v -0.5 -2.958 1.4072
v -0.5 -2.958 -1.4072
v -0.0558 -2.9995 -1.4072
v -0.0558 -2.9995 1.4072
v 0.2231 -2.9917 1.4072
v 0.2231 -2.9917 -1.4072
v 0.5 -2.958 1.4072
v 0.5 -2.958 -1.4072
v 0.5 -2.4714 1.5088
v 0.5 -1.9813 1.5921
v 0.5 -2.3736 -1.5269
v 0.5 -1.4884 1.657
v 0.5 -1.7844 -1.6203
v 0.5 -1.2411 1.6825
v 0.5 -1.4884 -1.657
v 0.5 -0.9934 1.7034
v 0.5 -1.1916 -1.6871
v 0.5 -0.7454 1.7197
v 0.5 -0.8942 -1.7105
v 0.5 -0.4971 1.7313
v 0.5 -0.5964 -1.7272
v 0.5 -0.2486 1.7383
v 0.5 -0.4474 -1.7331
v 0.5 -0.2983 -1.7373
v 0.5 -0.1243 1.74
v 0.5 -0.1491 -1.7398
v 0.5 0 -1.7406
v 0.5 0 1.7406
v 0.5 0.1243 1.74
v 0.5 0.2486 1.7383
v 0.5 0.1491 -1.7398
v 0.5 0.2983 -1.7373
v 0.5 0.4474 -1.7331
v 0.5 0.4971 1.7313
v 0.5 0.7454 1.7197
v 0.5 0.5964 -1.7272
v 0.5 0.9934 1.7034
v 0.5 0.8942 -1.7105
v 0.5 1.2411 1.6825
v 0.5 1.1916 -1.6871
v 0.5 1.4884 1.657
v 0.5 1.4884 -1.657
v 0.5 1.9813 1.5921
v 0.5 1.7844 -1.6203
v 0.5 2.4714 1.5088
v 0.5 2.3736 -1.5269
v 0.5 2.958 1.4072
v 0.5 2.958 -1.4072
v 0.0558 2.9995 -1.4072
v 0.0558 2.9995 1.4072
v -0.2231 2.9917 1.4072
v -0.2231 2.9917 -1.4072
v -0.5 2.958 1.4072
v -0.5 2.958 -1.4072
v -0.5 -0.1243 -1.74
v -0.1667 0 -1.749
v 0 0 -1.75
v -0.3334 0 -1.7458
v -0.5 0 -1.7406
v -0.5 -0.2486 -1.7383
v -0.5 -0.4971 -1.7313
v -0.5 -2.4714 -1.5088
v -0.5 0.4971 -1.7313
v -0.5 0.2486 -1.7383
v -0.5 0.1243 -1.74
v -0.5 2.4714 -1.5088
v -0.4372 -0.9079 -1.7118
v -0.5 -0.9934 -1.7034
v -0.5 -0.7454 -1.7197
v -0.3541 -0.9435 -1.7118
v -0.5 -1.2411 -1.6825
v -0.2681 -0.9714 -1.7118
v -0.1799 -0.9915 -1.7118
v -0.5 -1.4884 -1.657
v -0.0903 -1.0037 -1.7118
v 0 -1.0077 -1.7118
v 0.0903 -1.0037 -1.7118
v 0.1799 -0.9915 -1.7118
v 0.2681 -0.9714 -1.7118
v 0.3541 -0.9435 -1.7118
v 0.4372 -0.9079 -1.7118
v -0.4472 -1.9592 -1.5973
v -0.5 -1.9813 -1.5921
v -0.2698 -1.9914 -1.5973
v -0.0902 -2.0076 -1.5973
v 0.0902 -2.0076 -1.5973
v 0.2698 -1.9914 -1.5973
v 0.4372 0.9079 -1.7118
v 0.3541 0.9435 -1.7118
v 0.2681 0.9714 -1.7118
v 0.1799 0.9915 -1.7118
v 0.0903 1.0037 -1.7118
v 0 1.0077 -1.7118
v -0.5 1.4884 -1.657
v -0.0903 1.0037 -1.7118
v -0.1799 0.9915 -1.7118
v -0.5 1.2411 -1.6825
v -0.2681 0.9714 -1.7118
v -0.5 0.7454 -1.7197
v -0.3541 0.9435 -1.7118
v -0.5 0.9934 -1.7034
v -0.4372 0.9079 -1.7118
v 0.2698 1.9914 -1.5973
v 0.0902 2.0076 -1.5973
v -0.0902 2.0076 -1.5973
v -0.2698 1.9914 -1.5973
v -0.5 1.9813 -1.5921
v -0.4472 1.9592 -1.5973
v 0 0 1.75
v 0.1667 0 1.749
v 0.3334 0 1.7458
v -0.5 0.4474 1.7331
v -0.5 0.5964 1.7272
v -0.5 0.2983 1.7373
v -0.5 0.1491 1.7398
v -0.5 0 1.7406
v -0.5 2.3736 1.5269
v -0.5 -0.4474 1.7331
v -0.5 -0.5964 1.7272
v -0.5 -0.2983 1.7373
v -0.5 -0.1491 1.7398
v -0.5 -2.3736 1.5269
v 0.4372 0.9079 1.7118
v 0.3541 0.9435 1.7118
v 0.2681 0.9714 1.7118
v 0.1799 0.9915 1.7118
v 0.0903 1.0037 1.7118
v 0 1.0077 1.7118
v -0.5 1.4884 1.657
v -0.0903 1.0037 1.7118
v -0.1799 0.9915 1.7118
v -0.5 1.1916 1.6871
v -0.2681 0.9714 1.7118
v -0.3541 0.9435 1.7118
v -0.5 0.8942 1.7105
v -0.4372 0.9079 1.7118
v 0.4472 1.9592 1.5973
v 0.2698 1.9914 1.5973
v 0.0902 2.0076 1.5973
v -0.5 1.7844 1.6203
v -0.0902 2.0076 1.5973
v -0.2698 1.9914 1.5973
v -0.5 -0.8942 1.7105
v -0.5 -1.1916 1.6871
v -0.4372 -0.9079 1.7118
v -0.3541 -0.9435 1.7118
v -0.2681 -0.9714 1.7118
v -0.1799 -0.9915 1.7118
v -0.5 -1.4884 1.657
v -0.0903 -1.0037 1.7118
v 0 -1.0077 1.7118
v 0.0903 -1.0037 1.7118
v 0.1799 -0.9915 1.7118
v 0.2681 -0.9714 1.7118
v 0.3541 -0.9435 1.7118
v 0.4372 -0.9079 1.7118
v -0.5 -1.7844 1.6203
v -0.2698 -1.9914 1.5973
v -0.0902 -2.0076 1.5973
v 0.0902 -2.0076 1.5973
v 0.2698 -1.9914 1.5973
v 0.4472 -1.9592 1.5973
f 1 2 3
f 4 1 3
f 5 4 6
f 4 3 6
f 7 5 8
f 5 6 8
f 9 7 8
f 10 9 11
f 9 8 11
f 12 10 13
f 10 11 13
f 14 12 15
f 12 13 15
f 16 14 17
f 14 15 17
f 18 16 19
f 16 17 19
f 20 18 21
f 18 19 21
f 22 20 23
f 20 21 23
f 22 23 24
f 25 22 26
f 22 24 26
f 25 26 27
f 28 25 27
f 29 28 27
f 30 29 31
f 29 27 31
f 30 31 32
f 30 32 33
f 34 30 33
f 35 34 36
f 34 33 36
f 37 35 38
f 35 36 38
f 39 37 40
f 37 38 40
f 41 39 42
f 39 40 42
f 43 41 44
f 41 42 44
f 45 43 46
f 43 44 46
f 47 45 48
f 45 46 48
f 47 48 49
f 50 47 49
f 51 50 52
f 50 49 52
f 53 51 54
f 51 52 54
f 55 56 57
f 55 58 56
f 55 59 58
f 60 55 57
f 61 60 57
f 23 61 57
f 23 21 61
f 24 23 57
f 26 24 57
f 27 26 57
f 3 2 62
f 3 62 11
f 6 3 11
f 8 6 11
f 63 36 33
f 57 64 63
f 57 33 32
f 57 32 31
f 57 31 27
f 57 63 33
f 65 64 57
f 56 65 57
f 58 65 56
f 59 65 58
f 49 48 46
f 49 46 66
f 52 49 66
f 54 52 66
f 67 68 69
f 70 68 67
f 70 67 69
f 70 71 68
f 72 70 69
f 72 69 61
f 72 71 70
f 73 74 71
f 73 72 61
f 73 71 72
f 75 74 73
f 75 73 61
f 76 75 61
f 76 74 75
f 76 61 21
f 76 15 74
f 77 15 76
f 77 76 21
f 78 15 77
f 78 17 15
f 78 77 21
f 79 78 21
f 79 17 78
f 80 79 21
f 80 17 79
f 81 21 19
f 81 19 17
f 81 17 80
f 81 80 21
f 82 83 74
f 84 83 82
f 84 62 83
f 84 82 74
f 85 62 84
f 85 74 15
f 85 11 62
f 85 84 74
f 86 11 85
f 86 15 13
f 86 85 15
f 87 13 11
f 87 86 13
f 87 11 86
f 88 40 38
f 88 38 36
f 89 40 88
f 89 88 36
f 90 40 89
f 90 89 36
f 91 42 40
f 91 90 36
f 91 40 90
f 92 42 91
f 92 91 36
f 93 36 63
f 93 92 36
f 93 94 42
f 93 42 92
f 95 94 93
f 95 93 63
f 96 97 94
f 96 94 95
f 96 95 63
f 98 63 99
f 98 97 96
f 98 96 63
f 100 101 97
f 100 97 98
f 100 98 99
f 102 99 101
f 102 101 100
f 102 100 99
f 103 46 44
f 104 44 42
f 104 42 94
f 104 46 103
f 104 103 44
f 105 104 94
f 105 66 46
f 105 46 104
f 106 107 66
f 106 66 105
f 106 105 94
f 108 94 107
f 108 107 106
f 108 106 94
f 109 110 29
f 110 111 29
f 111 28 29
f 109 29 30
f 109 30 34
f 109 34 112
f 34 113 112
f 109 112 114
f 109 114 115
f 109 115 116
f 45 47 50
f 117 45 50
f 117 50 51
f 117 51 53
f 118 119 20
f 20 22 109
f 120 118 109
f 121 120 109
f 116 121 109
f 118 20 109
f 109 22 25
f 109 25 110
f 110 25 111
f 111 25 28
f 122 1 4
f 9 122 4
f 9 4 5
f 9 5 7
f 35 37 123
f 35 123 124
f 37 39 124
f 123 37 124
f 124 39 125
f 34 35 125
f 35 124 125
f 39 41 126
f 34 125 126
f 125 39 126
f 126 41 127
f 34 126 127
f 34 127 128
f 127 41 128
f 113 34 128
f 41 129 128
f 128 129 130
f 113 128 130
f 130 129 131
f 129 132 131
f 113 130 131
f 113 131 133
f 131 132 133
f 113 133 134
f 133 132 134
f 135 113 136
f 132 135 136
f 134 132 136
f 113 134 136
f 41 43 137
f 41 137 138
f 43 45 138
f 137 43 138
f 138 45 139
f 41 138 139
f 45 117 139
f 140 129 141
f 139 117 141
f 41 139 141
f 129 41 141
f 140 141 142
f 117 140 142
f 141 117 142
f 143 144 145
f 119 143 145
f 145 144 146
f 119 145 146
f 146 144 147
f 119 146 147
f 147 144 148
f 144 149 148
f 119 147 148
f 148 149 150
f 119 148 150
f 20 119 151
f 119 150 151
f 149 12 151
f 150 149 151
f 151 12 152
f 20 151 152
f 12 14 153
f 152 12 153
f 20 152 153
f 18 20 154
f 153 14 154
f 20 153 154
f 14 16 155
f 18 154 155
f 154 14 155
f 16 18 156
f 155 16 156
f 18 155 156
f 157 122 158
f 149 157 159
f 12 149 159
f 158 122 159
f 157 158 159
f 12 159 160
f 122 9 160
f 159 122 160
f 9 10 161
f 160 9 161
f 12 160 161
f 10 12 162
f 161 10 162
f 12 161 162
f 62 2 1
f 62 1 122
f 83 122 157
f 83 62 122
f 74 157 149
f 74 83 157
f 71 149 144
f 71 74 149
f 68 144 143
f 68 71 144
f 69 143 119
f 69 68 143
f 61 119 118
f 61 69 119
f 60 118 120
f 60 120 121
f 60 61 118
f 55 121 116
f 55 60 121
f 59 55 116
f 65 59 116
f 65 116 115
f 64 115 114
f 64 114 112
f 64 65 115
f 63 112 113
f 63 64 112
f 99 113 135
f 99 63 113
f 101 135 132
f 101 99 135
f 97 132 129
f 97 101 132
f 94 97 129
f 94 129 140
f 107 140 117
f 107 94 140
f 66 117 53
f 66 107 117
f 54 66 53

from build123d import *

# Parameters (mm, degrees)
BOSS_EXTRUDE1_DEPTH      = 10
BOSS_EXTRUDE1_DEPTH_BACK = 10
SKETCH1_R                = 3
CUT_EXTRUDE1_DEPTH       = 10
CUT_EXTRUDE1_DEPTH_BACK  = 10
SKETCH11_OUTSIDE_W       = 9.836
SKETCH11_OUTSIDE_H       = 9.836
SKETCH11_OUTSIDE_W_2     = 1
SKETCH11_OUTSIDE_H_2     = 6.690443666


with BuildPart() as part:
    # Sketch1 → Boss-Extrude1 (new, two sides: drawn at the far end of the back side and taken through both)
    with BuildSketch(Plane.XY.offset(-BOSS_EXTRUDE1_DEPTH_BACK)):
        Circle(SKETCH1_R)
    extrude(amount=BOSS_EXTRUDE1_DEPTH + BOSS_EXTRUDE1_DEPTH_BACK)

    # Sketch7 → Cut-Revolve5 (revolve, cut)
    with BuildSketch(Plane(origin=(0, 0, 0), x_dir=(1, 0, 0), z_dir=(0, 1, 0))):
        with BuildLine():
            Line((-5.350229687, -0.626413359), (-7.837029965, -11.630035865))
            Line((-7.837029965, -11.630035865), (0, -12.681735183))
            Line((0, -12.681735183), (0, -1.75))
            ThreePointArc((0, -1.75), (-2.733468705, -1.466072712), (-5.350229687, -0.626413359))
        make_face()
    revolve(axis=Axis((0, 0, -10), (0, 0, 1)), mode=Mode.SUBTRACT)

    # Sketch10 → Cut-Revolve6 (revolve, cut)
    with BuildSketch(Plane(origin=(0, 0, 0), x_dir=(1, 0, 0), z_dir=(0, 1, 0))):
        with BuildLine():
            Line((-9.335027104, -2.076496478), (-9.335027104, 13.220347749))
            Line((-9.335027104, 13.220347749), (0, 13.220347749))
            Line((0, 13.220347749), (0, 1.75))
            ThreePointArc((0, 1.75), (-5.044422819, 0.75625038), (-9.335027104, -2.076496478))
        make_face()
    revolve(axis=Axis((0, 0, -13.220347749), (0, 0, 1)), mode=Mode.SUBTRACT)

    # Sketch11 outside → Cut-Extrude1 (cut, two sides: drawn at the far end of the back side and taken through both)
    with BuildSketch(Plane.XY.offset(-CUT_EXTRUDE1_DEPTH_BACK)):
        Rectangle(SKETCH11_OUTSIDE_W, SKETCH11_OUTSIDE_H)
        Rectangle(SKETCH11_OUTSIDE_W_2, SKETCH11_OUTSIDE_H_2, mode=Mode.SUBTRACT)
    extrude(amount=CUT_EXTRUDE1_DEPTH + CUT_EXTRUDE1_DEPTH_BACK, mode=Mode.SUBTRACT)


solid = part.part
